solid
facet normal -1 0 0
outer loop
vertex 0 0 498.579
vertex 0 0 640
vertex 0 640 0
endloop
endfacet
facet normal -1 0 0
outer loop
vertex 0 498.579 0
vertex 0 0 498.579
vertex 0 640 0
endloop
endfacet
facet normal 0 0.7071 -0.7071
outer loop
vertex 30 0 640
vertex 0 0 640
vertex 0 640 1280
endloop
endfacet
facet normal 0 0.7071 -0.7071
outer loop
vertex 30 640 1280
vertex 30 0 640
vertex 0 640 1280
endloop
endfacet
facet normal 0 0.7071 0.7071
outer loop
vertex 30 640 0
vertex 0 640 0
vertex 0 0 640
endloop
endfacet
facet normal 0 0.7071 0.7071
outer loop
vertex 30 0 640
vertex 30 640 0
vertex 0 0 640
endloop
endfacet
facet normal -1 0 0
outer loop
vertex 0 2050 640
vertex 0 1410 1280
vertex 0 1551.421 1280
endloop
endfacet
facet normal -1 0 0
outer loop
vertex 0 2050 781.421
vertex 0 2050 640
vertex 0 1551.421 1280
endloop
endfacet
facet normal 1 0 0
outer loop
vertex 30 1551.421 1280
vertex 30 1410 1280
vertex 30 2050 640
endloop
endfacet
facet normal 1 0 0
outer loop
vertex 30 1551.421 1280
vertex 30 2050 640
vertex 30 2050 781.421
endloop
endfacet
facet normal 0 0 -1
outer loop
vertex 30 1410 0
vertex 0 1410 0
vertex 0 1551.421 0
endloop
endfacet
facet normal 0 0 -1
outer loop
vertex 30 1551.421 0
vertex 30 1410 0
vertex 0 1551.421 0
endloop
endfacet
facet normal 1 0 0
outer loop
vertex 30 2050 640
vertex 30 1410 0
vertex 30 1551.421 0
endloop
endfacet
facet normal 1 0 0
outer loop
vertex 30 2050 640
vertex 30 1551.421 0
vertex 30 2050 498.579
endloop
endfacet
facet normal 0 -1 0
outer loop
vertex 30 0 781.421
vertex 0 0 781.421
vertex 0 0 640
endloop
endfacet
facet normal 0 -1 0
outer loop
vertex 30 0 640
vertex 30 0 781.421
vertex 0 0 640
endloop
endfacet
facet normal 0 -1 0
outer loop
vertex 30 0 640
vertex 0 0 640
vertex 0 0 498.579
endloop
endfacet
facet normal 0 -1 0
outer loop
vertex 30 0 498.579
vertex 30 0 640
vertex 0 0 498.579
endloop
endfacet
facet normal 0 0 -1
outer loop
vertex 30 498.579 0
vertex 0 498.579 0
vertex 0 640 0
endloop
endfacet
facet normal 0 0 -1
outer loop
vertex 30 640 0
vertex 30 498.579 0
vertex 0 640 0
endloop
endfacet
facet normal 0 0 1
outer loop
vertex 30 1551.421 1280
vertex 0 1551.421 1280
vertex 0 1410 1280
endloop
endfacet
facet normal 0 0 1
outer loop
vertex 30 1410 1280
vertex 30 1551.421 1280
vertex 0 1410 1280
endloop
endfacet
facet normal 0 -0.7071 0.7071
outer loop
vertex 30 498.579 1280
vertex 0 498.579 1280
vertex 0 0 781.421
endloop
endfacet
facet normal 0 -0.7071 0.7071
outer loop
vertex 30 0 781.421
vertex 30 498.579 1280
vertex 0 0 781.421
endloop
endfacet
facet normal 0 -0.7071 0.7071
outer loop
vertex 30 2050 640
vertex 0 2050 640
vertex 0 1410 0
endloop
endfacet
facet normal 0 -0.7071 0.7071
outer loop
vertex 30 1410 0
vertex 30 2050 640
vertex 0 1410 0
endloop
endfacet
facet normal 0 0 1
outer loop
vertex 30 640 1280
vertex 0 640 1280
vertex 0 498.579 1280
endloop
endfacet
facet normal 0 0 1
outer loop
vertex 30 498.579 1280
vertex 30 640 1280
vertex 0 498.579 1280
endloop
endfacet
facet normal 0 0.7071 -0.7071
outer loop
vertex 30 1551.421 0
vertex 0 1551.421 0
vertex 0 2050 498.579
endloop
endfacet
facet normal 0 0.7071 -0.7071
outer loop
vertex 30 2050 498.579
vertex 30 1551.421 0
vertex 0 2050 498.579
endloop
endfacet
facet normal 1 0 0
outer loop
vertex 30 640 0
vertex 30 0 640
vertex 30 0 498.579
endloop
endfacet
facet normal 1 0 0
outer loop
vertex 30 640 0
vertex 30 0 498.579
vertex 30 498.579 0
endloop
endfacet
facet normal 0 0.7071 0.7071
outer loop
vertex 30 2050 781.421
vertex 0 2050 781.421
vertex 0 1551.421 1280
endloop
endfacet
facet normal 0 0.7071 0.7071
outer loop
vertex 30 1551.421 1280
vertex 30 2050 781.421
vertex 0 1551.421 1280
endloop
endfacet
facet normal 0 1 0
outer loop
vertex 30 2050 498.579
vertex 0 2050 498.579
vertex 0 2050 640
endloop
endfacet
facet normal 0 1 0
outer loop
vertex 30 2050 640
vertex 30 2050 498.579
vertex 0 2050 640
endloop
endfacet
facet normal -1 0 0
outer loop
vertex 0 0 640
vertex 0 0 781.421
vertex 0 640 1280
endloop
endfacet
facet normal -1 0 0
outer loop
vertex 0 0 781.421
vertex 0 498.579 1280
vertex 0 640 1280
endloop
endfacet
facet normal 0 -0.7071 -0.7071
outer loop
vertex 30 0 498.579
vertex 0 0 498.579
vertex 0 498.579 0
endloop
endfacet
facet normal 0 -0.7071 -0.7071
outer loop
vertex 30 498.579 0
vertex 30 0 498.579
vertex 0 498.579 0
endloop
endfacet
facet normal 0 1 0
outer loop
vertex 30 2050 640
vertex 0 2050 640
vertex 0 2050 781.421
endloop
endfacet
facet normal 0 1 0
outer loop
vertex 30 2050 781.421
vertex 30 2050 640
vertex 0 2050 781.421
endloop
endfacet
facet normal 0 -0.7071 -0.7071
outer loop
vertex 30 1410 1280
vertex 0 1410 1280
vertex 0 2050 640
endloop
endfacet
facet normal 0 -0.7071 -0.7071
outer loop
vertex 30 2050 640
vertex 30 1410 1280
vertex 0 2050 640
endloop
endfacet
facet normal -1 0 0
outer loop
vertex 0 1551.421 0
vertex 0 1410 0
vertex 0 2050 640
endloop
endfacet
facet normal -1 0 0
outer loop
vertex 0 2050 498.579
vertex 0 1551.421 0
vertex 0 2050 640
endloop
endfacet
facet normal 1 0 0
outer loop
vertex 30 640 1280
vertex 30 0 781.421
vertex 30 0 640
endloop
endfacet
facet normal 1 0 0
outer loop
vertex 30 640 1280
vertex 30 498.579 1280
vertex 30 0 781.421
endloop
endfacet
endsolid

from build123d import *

# Parameters (mm, degrees)
F1_DEPTH = 30


with BuildPart() as f1:
    # F0 (on Right) → F1 (new body)
    with BuildSketch(Plane.YZ):
        Polygon((0, 781.421356), (0, 640), (640, 1280), (498.578644, 1280), align=None)
        Polygon((0, 640), (0, 498.578644), (498.578644, 0), (640, 0), align=None)
        Polygon((2050, 498.578644), (2050, 640), (1410, 0), (1551.421356, 0), align=None)
        Polygon((2050, 781.421356), (1551.421356, 1280), (1410, 1280), (2050, 640), align=None)
    extrude(amount=F1_DEPTH)


solid = f1.part
